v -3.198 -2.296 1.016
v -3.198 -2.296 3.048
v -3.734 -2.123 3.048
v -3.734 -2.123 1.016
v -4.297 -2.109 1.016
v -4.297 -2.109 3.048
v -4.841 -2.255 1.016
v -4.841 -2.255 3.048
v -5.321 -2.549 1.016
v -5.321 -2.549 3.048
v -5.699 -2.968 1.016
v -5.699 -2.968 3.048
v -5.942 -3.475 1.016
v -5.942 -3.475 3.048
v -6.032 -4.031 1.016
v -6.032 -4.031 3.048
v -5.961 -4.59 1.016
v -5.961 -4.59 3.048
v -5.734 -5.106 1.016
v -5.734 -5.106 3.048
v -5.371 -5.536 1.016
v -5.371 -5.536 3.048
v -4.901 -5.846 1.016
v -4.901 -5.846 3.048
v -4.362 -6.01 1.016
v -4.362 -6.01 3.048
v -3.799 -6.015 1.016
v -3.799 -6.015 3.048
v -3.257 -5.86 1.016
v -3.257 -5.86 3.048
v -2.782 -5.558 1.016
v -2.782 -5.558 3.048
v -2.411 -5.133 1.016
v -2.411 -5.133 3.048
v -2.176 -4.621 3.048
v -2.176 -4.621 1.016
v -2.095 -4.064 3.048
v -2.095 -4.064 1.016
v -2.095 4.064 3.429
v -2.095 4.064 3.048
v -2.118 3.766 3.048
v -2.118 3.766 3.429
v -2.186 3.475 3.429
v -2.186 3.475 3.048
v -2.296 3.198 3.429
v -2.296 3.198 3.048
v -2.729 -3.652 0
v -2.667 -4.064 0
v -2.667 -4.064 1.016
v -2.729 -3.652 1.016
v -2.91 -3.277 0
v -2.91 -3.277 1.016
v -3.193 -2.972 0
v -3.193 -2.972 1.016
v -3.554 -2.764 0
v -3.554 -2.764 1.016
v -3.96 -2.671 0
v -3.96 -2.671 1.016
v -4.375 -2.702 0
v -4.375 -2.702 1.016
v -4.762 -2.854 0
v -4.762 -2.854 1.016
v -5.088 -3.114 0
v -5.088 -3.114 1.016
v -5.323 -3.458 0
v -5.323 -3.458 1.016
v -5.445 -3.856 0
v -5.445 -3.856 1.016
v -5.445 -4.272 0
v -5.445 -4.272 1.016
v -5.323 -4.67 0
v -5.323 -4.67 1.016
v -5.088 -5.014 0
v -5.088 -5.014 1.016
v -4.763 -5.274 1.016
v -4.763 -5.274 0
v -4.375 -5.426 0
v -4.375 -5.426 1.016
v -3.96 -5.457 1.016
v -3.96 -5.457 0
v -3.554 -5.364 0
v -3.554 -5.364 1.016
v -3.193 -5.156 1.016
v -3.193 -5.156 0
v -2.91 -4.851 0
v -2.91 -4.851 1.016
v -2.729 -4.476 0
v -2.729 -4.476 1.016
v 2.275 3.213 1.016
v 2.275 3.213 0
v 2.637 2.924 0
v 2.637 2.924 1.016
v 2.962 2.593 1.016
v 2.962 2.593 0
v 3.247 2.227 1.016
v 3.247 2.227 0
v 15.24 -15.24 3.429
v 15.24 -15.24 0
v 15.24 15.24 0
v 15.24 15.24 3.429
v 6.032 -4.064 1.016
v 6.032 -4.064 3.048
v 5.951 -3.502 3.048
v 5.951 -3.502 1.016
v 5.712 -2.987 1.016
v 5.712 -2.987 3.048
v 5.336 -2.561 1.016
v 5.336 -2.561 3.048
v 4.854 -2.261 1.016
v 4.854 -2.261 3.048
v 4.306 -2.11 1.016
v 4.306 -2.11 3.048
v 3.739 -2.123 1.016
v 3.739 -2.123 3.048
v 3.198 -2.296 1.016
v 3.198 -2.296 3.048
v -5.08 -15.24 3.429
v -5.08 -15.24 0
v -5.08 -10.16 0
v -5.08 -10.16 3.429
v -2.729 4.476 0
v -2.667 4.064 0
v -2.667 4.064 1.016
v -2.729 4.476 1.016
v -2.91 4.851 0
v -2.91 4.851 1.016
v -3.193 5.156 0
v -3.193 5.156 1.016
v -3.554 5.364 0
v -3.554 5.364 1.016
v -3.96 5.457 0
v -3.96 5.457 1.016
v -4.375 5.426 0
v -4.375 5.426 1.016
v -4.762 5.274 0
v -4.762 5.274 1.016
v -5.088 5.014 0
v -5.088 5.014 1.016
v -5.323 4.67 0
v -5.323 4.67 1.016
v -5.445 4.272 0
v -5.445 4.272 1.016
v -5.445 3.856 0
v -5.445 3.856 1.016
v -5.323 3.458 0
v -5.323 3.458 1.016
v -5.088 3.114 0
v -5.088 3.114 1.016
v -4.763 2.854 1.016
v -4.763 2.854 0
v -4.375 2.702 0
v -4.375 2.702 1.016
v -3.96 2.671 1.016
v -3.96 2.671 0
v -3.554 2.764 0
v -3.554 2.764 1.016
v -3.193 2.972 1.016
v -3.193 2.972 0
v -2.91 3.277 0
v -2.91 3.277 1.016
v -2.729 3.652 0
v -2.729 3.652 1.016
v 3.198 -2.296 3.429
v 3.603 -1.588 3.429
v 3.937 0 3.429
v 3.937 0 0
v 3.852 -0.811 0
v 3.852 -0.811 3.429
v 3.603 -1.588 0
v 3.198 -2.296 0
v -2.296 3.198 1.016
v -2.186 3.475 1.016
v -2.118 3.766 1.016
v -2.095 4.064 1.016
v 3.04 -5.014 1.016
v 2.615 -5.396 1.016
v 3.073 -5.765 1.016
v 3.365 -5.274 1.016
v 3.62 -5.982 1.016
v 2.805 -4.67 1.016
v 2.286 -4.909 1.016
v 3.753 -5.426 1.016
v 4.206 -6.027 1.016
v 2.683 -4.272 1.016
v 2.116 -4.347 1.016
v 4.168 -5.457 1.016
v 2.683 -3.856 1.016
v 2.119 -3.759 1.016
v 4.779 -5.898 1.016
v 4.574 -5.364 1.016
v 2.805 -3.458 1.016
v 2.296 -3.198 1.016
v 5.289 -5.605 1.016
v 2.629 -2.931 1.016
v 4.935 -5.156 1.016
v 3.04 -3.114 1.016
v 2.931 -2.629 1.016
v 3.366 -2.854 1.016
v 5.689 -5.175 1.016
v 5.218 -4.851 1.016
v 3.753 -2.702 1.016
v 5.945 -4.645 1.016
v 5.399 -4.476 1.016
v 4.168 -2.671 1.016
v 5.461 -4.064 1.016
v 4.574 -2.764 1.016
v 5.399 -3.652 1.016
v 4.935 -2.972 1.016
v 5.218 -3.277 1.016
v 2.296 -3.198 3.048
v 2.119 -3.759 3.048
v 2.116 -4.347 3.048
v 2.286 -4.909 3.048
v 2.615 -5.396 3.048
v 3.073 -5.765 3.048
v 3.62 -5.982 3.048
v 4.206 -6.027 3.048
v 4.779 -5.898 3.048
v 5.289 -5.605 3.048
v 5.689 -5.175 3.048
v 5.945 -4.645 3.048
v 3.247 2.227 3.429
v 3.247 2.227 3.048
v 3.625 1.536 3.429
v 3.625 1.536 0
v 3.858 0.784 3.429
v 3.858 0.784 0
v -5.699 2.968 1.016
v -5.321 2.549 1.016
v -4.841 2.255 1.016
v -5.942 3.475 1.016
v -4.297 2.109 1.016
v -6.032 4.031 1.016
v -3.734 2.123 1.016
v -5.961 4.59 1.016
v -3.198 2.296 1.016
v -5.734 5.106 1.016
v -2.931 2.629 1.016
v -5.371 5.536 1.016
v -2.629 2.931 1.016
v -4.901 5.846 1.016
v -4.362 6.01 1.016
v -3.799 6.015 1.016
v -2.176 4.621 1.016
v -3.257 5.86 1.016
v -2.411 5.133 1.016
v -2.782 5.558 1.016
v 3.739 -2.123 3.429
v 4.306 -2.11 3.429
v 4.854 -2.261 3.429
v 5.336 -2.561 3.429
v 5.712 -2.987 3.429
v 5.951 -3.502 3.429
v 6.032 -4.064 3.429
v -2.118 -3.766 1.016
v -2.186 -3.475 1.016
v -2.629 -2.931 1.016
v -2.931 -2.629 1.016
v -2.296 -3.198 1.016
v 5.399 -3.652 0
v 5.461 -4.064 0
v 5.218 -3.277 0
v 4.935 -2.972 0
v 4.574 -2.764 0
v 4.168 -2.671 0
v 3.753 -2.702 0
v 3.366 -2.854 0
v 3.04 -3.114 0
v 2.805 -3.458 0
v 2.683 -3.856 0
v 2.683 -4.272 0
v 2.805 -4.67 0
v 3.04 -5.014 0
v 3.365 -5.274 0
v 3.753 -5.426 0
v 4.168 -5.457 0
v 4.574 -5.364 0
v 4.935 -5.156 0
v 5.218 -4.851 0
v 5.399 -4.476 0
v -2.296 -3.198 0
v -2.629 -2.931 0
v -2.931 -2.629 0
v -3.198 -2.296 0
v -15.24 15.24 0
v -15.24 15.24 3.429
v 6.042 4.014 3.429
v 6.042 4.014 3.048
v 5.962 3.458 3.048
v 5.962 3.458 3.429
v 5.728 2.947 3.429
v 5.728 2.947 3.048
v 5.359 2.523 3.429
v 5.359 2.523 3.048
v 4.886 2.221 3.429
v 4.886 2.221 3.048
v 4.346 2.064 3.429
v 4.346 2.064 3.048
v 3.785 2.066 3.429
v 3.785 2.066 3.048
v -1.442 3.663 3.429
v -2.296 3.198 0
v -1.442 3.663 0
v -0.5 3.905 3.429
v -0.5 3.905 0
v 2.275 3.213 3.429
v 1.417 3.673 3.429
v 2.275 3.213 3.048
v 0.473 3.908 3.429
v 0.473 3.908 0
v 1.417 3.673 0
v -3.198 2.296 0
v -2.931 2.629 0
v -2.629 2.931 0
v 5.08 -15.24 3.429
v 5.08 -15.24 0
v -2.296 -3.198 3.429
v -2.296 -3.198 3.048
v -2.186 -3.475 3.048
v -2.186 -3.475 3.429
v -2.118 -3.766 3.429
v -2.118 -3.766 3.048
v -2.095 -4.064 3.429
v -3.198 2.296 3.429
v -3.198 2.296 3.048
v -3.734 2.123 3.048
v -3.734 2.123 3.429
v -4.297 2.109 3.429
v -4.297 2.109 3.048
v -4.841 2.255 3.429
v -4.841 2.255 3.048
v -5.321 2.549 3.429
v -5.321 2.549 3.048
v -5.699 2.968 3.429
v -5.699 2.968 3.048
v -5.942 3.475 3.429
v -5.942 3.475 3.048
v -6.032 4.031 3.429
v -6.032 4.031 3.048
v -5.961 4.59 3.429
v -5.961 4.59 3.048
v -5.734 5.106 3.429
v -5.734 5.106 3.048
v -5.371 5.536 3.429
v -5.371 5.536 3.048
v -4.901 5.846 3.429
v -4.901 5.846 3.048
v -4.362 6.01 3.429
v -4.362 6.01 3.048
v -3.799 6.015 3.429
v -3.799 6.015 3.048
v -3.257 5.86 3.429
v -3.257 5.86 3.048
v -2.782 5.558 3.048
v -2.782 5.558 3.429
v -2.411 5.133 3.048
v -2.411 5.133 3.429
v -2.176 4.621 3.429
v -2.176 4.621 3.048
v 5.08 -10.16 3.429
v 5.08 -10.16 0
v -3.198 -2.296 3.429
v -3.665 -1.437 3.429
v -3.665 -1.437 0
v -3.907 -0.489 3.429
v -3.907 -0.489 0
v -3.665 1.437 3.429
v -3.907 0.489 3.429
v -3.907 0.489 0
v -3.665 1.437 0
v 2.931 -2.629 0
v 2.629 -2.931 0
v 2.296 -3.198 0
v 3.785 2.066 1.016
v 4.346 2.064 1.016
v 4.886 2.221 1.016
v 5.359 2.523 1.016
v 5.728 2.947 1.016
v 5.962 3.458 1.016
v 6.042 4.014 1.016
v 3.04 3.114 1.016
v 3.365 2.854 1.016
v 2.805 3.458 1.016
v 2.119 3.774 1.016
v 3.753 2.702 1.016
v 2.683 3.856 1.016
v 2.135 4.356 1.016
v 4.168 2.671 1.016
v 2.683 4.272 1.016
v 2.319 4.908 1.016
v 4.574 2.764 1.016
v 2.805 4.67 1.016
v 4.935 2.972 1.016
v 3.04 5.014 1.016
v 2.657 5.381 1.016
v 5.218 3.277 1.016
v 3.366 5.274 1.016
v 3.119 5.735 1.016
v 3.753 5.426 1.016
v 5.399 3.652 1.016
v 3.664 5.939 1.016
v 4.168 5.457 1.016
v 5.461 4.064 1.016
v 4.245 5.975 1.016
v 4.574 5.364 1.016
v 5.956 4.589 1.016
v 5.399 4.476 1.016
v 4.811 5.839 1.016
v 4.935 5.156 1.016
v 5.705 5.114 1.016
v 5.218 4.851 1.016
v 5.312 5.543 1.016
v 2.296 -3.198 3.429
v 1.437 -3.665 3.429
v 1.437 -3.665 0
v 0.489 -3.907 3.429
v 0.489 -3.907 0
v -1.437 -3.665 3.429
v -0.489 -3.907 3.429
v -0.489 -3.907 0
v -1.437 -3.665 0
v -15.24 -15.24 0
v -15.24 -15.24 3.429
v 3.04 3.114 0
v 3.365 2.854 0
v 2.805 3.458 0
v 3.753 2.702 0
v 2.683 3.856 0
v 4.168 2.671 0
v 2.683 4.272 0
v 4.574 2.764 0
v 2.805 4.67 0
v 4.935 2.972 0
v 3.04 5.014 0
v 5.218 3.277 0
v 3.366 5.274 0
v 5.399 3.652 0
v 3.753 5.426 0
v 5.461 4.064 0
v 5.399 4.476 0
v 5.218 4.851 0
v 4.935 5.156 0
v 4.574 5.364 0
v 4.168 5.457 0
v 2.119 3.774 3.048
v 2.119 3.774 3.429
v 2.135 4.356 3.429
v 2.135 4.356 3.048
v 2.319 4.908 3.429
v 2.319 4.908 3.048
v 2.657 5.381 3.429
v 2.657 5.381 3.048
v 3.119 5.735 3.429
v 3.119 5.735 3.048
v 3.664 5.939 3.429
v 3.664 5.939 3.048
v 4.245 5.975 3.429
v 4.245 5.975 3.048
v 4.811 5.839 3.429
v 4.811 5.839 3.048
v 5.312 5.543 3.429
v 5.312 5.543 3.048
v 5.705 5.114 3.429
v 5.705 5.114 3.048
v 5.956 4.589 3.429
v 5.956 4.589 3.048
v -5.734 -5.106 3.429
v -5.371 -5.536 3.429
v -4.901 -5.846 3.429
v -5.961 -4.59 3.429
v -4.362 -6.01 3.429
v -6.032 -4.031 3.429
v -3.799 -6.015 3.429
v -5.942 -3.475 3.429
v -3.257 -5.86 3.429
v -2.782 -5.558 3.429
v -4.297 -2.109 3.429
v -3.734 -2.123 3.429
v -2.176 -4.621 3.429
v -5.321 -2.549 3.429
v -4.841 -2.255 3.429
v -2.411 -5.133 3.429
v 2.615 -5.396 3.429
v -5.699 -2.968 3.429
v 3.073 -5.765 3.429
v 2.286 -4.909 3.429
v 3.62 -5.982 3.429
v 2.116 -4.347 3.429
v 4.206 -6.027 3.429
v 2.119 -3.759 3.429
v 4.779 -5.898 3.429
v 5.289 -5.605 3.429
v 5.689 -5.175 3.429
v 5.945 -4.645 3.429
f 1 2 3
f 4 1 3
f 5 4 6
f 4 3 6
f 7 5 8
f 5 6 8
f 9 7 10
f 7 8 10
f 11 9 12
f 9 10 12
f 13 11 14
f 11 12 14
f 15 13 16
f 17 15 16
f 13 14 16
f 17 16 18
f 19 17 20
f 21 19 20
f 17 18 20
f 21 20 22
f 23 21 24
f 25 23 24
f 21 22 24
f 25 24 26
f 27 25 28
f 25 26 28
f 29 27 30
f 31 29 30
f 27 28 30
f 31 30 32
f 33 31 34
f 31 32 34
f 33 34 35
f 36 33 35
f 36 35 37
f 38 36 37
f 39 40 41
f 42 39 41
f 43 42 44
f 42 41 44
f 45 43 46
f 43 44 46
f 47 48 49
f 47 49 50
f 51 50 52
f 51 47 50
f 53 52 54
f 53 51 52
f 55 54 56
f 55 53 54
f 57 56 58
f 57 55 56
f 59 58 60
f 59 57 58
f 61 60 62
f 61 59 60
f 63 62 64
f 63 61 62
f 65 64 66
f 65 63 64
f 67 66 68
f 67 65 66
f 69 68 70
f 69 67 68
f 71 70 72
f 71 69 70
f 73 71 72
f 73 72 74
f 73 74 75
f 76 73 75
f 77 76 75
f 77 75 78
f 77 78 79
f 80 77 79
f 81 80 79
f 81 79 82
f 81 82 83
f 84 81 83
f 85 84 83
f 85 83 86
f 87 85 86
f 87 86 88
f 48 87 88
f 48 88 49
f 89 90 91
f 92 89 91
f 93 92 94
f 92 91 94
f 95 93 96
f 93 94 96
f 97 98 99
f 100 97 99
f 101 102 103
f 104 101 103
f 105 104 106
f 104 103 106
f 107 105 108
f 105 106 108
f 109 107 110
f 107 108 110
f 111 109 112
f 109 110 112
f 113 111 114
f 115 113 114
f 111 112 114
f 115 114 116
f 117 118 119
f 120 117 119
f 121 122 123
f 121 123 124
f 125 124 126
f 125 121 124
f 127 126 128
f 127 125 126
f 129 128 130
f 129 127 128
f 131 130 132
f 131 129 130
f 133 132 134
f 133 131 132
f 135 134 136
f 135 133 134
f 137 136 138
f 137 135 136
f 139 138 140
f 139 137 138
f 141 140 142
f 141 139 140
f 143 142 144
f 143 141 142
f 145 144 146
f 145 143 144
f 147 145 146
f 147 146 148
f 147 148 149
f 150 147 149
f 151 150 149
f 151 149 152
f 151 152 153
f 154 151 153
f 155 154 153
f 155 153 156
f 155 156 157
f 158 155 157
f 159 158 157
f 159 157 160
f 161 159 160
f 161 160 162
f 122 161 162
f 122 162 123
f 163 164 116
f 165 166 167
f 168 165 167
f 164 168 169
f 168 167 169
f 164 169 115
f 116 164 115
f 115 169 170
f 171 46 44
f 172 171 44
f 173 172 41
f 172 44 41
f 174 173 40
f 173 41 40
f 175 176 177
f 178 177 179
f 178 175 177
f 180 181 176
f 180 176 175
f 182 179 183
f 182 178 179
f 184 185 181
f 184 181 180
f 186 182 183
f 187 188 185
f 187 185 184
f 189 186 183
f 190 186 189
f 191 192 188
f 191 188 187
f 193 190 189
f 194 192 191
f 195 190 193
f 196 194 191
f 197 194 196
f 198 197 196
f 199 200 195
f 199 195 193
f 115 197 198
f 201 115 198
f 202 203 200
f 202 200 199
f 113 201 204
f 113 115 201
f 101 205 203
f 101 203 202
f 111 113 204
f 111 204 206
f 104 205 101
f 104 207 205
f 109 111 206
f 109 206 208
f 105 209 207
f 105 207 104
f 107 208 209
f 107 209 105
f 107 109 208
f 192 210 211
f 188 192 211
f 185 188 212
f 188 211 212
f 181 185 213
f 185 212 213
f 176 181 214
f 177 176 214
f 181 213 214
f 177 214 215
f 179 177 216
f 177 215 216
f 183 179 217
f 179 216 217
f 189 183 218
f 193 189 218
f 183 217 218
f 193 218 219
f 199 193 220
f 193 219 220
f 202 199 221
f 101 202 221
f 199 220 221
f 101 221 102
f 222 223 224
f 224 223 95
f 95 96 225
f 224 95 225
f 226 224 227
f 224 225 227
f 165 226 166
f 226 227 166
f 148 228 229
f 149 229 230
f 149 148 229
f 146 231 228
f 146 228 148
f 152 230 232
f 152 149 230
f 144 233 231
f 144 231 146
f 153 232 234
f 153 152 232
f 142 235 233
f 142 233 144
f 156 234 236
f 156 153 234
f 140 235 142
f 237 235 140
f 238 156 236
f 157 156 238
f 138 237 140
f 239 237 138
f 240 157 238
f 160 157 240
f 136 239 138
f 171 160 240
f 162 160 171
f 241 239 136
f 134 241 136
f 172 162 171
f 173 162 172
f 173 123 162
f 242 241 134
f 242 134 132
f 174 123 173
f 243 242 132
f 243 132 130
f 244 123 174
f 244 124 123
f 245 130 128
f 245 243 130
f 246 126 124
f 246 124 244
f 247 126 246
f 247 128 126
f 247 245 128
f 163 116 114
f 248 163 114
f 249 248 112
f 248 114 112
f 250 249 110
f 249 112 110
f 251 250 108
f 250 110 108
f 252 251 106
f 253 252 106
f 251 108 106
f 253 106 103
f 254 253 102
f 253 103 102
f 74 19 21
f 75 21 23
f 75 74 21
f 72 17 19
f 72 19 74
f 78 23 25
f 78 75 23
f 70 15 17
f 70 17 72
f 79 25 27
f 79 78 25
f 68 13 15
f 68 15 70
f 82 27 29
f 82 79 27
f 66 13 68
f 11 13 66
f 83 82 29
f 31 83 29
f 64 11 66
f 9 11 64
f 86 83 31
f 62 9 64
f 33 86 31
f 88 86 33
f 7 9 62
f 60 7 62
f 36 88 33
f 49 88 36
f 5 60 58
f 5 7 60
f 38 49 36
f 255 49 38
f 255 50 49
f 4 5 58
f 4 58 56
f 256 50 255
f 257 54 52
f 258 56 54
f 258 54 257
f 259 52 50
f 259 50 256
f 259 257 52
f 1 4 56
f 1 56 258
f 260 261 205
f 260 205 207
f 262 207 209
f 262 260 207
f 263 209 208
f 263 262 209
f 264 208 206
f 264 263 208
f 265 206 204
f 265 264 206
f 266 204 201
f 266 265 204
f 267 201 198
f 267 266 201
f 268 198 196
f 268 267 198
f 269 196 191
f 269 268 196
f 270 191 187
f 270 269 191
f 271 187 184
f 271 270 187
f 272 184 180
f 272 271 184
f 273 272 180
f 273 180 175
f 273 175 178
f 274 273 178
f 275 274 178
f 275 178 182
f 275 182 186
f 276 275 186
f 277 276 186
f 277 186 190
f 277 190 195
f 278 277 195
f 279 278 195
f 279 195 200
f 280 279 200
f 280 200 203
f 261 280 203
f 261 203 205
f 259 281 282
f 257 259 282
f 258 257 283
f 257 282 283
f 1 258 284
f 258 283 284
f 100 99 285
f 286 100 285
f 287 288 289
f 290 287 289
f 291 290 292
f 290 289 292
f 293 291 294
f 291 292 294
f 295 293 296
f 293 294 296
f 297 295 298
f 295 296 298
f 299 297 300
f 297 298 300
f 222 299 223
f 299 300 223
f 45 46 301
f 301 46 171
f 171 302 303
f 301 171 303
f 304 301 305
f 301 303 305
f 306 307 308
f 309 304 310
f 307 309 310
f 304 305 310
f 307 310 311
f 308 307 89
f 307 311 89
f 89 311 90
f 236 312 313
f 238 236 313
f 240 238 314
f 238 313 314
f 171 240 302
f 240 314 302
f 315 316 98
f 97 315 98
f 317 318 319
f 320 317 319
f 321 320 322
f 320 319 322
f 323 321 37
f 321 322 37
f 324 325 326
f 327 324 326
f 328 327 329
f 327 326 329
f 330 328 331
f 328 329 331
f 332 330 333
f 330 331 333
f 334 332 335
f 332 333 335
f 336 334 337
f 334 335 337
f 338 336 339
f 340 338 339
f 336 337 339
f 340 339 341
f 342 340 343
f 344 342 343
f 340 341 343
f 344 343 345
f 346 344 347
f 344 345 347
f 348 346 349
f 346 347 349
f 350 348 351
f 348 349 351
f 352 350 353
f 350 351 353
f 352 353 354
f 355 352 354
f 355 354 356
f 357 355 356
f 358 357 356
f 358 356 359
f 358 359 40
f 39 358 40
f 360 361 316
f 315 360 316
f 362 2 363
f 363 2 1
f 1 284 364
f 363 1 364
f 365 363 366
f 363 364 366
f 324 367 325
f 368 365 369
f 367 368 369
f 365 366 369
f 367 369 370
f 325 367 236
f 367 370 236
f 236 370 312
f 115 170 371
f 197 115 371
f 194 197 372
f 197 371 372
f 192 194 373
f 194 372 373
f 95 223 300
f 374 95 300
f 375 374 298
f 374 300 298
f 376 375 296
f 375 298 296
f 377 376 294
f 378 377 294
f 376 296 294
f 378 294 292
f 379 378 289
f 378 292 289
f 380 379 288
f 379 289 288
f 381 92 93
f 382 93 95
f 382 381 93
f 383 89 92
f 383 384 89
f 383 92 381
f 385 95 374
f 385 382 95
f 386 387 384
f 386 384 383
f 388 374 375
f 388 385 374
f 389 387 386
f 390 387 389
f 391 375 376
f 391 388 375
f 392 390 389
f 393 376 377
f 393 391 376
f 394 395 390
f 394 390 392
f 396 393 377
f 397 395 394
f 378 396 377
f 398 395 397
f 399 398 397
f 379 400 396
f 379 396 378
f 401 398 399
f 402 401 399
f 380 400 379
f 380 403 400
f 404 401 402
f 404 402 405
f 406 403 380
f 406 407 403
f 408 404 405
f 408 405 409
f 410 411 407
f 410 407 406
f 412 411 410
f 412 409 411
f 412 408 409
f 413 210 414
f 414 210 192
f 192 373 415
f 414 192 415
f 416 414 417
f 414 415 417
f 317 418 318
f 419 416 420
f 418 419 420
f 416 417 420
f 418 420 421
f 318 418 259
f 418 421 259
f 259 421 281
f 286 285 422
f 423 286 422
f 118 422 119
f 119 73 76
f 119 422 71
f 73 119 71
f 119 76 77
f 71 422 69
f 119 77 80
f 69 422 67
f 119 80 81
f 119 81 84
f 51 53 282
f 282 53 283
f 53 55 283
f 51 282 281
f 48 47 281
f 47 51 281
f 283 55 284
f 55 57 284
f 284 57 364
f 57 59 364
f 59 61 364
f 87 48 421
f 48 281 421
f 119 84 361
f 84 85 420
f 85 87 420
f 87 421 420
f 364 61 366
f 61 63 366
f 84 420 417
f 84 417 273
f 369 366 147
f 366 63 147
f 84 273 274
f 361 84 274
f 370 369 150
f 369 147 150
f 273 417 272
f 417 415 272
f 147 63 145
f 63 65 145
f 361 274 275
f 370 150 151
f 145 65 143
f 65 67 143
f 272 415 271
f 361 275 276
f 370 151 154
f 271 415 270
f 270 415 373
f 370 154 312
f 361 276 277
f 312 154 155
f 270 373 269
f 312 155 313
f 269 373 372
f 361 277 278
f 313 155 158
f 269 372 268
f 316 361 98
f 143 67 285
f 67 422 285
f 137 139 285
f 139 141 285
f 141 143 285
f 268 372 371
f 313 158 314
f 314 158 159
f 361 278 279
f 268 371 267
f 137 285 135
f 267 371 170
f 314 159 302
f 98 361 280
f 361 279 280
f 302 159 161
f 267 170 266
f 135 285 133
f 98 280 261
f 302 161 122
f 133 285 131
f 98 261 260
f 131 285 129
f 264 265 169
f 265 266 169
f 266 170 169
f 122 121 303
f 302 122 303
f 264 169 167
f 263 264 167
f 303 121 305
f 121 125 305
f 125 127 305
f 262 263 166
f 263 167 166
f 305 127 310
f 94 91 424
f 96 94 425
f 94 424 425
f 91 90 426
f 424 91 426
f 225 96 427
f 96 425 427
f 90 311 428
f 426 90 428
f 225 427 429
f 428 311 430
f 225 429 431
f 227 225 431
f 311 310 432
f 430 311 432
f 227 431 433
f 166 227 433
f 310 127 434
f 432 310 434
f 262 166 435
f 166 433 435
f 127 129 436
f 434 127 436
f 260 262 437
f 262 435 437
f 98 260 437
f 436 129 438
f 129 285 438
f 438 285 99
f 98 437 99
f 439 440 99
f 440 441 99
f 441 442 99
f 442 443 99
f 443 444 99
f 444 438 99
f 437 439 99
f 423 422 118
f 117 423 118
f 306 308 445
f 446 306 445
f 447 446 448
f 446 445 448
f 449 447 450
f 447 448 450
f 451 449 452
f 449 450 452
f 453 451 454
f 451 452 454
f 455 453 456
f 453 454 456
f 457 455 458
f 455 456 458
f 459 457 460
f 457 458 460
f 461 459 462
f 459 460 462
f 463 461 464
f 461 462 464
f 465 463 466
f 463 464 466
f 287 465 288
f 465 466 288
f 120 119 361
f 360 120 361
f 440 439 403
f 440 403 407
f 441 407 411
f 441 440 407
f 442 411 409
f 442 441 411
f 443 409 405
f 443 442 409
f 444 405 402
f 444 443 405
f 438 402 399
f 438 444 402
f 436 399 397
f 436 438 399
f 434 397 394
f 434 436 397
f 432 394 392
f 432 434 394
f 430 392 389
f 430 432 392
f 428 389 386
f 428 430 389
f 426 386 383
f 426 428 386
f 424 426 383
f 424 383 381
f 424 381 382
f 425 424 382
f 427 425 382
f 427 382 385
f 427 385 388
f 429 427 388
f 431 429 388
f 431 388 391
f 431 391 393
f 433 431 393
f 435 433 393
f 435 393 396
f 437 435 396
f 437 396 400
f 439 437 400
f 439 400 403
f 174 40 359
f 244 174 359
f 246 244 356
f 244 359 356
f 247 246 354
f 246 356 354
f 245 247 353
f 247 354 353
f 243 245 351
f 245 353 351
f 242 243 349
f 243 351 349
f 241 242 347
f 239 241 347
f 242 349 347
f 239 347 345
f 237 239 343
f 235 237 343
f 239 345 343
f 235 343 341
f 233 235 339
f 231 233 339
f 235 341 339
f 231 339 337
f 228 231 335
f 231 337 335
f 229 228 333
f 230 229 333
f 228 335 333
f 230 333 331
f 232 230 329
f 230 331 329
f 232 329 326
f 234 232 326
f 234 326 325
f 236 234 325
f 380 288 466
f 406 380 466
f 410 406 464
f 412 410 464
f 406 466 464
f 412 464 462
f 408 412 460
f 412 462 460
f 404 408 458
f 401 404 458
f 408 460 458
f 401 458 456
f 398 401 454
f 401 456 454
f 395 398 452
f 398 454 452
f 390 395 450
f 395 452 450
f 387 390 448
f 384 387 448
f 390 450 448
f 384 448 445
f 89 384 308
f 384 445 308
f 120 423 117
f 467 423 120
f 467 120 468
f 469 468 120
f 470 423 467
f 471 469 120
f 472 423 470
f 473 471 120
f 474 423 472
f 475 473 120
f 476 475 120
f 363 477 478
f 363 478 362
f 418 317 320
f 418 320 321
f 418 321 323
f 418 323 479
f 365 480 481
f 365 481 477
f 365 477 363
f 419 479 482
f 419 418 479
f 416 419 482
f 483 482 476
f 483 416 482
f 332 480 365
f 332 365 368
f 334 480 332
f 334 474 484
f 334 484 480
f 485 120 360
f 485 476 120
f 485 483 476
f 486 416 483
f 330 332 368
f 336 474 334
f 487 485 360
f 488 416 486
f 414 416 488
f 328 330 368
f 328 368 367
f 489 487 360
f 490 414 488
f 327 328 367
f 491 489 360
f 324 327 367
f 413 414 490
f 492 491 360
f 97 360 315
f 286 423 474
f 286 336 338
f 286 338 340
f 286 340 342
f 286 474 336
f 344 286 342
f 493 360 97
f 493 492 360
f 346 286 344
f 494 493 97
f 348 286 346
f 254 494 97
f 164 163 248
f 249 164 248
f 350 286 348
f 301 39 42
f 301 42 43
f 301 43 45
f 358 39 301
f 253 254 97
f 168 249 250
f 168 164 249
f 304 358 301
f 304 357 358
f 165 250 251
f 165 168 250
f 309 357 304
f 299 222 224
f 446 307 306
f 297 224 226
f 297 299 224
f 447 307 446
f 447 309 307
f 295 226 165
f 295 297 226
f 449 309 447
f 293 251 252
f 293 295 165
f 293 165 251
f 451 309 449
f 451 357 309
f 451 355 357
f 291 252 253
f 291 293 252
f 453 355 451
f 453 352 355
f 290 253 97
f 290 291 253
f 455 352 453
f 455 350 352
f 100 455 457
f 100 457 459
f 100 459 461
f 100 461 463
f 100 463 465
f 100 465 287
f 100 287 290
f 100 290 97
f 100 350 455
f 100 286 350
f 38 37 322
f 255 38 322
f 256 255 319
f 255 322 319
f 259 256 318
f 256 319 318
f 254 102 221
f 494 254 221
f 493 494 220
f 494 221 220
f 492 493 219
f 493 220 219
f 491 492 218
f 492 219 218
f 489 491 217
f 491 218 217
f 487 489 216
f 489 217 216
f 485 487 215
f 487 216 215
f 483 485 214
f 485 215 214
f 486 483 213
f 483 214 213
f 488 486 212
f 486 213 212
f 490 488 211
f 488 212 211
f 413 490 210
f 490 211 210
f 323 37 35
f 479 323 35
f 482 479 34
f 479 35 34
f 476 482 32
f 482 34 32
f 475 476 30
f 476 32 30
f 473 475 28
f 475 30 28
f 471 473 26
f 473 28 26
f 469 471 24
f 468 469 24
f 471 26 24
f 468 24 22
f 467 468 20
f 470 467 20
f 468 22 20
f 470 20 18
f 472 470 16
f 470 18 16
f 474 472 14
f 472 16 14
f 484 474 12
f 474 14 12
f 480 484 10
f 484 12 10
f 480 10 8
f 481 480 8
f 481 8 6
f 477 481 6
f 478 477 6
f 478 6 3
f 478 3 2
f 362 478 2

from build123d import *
from build123d import SkipClean  # not in build123d's __all__

# Parameters (mm, degrees)
F1_DEPTH = 3.429
F0_R     = 1.397
F2_DEPTH = 3.048
F3_DEPTH = 2.032


with BuildPart() as f1:
    # F0 (on Top) → F1 (new body)
    with BuildSketch(Plane.XY):
        Polygon((15.24, -15.24), (15.24, 15.24), (-15.24, 15.24), (-15.24, -15.24), (-5.08, -15.24), (-5.08, -10.16), (5.08, -10.16), (5.08, -15.24), align=None)
        with BuildLine():
            ThreePointArc((3.2465476869, 2.227082647), (3.760427319, 1.1658281942), (3.937, 0))
            ThreePointArc((3.937, 0), (3.7477069339, -1.2060935857), (3.1980303594, -2.2962079219))
            ThreePointArc((3.1980303594, -2.2962079219), (5.1057127753, -2.3937225549), (6.0325, -4.064))
            ThreePointArc((6.0325, -4.064), (3.6195376595, -5.9816666754), (2.2962079219, -3.1980303594))
            ThreePointArc((2.2962079219, -3.1980303594), (0, -3.937), (-2.2962079219, -3.1980303594))
            ThreePointArc((-2.2962079219, -3.1980303594), (-2.1463333246, -3.6195376595), (-2.0955, -4.064))
            ThreePointArc((-2.0955, -4.064), (-5.7342774451, -5.1057127753), (-3.1980303594, -2.2962079219))
            ThreePointArc((-3.1980303594, -2.2962079219), (-3.937, 0), (-3.1980303594, 2.2962079219))
            ThreePointArc((-3.1980303594, 2.2962079219), (-5.7342774451, 5.1057127753), (-2.0955, 4.064))
            ThreePointArc((-2.0955, 4.064), (-2.1463333246, 3.6195376595), (-2.2962079219, 3.1980303594))
            ThreePointArc((-2.2962079219, 3.1980303594), (-0.0131703869, 3.9369779706), (2.2747600024, 3.2133216352))
            ThreePointArc((2.2747600024, 3.2133216352), (3.664202861, 5.9391021751), (6.0417570924, 4.0135718882))
            ThreePointArc((6.0417570924, 4.0135718882), (5.1333549146, 2.3549022836), (3.2465476869, 2.227082647))
        make_face(mode=Mode.SUBTRACT)
    extrude(amount=F1_DEPTH)

    # F0 (on Top) → F2 (join)
    with BuildSketch(Plane.XY):
        with BuildLine():
            ThreePointArc((-3.1980303594, 2.2962079219), (-2.7838793975, 2.7838793975), (-2.2962079219, 3.1980303594))
            ThreePointArc((-2.2962079219, 3.1980303594), (-2.1463333246, 3.6195376595), (-2.0955, 4.064))
            ThreePointArc((-2.0955, 4.064), (-5.7342774451, 5.1057127753), (-3.1980303594, 2.2962079219))
        make_face()
        with Locations((-4.064, 4.064)):
            Circle(F0_R, mode=Mode.SUBTRACT)
        with BuildLine():
            ThreePointArc((2.2747600024, 3.2133216352), (2.8043495655, 2.763257591), (3.2465476869, 2.227082647))
            ThreePointArc((3.2465476869, 2.227082647), (5.1333549146, 2.3549022836), (6.0417570924, 4.0135718882))
            ThreePointArc((6.0417570924, 4.0135718882), (3.664202861, 5.9391021751), (2.2747600024, 3.2133216352))
        make_face()
        with Locations((4.064, 4.064)):
            Circle(F0_R, mode=Mode.SUBTRACT)
        with BuildLine():
            ThreePointArc((-2.0955, -4.064), (-2.1463333246, -3.6195376595), (-2.2962079219, -3.1980303594))
            ThreePointArc((-2.2962079219, -3.1980303594), (-2.7838793975, -2.7838793975), (-3.1980303594, -2.2962079219))
            ThreePointArc((-3.1980303594, -2.2962079219), (-5.7342774451, -5.1057127753), (-2.0955, -4.064))
        make_face()
        with Locations((-4.064, -4.064)):
            Circle(F0_R, mode=Mode.SUBTRACT)
        with BuildLine():
            ThreePointArc((6.0325, -4.064), (5.1057127753, -2.3937225549), (3.1980303594, -2.2962079219))
            ThreePointArc((3.1980303594, -2.2962079219), (2.7838793975, -2.7838793975), (2.2962079219, -3.1980303594))
            ThreePointArc((2.2962079219, -3.1980303594), (3.6195376595, -5.9816666754), (6.0325, -4.064))
        make_face()
        with Locations((4.064, -4.064)):
            Circle(F0_R, mode=Mode.SUBTRACT)
    extrude(amount=F2_DEPTH)

    # F3 (cut): faces of the model
    f3_faces = [f1.faces().sort_by_distance(p)[0] for p in [
        (-2.8232493975, 2.8232493975, 3.048),
        (-5.4165696988, -5.4165696988, 3.048),
        (2.8440090574, 2.8023359547, 3.048),
        (5.4165696988, -5.4165696988, 3.048),
    ]]
    with SkipClean():  # cleaning this boolean's faces spoils the solid; the shape is the same uncleaned
        extrude(f3_faces, amount=-F3_DEPTH, mode=Mode.SUBTRACT)


solid = f1.part
